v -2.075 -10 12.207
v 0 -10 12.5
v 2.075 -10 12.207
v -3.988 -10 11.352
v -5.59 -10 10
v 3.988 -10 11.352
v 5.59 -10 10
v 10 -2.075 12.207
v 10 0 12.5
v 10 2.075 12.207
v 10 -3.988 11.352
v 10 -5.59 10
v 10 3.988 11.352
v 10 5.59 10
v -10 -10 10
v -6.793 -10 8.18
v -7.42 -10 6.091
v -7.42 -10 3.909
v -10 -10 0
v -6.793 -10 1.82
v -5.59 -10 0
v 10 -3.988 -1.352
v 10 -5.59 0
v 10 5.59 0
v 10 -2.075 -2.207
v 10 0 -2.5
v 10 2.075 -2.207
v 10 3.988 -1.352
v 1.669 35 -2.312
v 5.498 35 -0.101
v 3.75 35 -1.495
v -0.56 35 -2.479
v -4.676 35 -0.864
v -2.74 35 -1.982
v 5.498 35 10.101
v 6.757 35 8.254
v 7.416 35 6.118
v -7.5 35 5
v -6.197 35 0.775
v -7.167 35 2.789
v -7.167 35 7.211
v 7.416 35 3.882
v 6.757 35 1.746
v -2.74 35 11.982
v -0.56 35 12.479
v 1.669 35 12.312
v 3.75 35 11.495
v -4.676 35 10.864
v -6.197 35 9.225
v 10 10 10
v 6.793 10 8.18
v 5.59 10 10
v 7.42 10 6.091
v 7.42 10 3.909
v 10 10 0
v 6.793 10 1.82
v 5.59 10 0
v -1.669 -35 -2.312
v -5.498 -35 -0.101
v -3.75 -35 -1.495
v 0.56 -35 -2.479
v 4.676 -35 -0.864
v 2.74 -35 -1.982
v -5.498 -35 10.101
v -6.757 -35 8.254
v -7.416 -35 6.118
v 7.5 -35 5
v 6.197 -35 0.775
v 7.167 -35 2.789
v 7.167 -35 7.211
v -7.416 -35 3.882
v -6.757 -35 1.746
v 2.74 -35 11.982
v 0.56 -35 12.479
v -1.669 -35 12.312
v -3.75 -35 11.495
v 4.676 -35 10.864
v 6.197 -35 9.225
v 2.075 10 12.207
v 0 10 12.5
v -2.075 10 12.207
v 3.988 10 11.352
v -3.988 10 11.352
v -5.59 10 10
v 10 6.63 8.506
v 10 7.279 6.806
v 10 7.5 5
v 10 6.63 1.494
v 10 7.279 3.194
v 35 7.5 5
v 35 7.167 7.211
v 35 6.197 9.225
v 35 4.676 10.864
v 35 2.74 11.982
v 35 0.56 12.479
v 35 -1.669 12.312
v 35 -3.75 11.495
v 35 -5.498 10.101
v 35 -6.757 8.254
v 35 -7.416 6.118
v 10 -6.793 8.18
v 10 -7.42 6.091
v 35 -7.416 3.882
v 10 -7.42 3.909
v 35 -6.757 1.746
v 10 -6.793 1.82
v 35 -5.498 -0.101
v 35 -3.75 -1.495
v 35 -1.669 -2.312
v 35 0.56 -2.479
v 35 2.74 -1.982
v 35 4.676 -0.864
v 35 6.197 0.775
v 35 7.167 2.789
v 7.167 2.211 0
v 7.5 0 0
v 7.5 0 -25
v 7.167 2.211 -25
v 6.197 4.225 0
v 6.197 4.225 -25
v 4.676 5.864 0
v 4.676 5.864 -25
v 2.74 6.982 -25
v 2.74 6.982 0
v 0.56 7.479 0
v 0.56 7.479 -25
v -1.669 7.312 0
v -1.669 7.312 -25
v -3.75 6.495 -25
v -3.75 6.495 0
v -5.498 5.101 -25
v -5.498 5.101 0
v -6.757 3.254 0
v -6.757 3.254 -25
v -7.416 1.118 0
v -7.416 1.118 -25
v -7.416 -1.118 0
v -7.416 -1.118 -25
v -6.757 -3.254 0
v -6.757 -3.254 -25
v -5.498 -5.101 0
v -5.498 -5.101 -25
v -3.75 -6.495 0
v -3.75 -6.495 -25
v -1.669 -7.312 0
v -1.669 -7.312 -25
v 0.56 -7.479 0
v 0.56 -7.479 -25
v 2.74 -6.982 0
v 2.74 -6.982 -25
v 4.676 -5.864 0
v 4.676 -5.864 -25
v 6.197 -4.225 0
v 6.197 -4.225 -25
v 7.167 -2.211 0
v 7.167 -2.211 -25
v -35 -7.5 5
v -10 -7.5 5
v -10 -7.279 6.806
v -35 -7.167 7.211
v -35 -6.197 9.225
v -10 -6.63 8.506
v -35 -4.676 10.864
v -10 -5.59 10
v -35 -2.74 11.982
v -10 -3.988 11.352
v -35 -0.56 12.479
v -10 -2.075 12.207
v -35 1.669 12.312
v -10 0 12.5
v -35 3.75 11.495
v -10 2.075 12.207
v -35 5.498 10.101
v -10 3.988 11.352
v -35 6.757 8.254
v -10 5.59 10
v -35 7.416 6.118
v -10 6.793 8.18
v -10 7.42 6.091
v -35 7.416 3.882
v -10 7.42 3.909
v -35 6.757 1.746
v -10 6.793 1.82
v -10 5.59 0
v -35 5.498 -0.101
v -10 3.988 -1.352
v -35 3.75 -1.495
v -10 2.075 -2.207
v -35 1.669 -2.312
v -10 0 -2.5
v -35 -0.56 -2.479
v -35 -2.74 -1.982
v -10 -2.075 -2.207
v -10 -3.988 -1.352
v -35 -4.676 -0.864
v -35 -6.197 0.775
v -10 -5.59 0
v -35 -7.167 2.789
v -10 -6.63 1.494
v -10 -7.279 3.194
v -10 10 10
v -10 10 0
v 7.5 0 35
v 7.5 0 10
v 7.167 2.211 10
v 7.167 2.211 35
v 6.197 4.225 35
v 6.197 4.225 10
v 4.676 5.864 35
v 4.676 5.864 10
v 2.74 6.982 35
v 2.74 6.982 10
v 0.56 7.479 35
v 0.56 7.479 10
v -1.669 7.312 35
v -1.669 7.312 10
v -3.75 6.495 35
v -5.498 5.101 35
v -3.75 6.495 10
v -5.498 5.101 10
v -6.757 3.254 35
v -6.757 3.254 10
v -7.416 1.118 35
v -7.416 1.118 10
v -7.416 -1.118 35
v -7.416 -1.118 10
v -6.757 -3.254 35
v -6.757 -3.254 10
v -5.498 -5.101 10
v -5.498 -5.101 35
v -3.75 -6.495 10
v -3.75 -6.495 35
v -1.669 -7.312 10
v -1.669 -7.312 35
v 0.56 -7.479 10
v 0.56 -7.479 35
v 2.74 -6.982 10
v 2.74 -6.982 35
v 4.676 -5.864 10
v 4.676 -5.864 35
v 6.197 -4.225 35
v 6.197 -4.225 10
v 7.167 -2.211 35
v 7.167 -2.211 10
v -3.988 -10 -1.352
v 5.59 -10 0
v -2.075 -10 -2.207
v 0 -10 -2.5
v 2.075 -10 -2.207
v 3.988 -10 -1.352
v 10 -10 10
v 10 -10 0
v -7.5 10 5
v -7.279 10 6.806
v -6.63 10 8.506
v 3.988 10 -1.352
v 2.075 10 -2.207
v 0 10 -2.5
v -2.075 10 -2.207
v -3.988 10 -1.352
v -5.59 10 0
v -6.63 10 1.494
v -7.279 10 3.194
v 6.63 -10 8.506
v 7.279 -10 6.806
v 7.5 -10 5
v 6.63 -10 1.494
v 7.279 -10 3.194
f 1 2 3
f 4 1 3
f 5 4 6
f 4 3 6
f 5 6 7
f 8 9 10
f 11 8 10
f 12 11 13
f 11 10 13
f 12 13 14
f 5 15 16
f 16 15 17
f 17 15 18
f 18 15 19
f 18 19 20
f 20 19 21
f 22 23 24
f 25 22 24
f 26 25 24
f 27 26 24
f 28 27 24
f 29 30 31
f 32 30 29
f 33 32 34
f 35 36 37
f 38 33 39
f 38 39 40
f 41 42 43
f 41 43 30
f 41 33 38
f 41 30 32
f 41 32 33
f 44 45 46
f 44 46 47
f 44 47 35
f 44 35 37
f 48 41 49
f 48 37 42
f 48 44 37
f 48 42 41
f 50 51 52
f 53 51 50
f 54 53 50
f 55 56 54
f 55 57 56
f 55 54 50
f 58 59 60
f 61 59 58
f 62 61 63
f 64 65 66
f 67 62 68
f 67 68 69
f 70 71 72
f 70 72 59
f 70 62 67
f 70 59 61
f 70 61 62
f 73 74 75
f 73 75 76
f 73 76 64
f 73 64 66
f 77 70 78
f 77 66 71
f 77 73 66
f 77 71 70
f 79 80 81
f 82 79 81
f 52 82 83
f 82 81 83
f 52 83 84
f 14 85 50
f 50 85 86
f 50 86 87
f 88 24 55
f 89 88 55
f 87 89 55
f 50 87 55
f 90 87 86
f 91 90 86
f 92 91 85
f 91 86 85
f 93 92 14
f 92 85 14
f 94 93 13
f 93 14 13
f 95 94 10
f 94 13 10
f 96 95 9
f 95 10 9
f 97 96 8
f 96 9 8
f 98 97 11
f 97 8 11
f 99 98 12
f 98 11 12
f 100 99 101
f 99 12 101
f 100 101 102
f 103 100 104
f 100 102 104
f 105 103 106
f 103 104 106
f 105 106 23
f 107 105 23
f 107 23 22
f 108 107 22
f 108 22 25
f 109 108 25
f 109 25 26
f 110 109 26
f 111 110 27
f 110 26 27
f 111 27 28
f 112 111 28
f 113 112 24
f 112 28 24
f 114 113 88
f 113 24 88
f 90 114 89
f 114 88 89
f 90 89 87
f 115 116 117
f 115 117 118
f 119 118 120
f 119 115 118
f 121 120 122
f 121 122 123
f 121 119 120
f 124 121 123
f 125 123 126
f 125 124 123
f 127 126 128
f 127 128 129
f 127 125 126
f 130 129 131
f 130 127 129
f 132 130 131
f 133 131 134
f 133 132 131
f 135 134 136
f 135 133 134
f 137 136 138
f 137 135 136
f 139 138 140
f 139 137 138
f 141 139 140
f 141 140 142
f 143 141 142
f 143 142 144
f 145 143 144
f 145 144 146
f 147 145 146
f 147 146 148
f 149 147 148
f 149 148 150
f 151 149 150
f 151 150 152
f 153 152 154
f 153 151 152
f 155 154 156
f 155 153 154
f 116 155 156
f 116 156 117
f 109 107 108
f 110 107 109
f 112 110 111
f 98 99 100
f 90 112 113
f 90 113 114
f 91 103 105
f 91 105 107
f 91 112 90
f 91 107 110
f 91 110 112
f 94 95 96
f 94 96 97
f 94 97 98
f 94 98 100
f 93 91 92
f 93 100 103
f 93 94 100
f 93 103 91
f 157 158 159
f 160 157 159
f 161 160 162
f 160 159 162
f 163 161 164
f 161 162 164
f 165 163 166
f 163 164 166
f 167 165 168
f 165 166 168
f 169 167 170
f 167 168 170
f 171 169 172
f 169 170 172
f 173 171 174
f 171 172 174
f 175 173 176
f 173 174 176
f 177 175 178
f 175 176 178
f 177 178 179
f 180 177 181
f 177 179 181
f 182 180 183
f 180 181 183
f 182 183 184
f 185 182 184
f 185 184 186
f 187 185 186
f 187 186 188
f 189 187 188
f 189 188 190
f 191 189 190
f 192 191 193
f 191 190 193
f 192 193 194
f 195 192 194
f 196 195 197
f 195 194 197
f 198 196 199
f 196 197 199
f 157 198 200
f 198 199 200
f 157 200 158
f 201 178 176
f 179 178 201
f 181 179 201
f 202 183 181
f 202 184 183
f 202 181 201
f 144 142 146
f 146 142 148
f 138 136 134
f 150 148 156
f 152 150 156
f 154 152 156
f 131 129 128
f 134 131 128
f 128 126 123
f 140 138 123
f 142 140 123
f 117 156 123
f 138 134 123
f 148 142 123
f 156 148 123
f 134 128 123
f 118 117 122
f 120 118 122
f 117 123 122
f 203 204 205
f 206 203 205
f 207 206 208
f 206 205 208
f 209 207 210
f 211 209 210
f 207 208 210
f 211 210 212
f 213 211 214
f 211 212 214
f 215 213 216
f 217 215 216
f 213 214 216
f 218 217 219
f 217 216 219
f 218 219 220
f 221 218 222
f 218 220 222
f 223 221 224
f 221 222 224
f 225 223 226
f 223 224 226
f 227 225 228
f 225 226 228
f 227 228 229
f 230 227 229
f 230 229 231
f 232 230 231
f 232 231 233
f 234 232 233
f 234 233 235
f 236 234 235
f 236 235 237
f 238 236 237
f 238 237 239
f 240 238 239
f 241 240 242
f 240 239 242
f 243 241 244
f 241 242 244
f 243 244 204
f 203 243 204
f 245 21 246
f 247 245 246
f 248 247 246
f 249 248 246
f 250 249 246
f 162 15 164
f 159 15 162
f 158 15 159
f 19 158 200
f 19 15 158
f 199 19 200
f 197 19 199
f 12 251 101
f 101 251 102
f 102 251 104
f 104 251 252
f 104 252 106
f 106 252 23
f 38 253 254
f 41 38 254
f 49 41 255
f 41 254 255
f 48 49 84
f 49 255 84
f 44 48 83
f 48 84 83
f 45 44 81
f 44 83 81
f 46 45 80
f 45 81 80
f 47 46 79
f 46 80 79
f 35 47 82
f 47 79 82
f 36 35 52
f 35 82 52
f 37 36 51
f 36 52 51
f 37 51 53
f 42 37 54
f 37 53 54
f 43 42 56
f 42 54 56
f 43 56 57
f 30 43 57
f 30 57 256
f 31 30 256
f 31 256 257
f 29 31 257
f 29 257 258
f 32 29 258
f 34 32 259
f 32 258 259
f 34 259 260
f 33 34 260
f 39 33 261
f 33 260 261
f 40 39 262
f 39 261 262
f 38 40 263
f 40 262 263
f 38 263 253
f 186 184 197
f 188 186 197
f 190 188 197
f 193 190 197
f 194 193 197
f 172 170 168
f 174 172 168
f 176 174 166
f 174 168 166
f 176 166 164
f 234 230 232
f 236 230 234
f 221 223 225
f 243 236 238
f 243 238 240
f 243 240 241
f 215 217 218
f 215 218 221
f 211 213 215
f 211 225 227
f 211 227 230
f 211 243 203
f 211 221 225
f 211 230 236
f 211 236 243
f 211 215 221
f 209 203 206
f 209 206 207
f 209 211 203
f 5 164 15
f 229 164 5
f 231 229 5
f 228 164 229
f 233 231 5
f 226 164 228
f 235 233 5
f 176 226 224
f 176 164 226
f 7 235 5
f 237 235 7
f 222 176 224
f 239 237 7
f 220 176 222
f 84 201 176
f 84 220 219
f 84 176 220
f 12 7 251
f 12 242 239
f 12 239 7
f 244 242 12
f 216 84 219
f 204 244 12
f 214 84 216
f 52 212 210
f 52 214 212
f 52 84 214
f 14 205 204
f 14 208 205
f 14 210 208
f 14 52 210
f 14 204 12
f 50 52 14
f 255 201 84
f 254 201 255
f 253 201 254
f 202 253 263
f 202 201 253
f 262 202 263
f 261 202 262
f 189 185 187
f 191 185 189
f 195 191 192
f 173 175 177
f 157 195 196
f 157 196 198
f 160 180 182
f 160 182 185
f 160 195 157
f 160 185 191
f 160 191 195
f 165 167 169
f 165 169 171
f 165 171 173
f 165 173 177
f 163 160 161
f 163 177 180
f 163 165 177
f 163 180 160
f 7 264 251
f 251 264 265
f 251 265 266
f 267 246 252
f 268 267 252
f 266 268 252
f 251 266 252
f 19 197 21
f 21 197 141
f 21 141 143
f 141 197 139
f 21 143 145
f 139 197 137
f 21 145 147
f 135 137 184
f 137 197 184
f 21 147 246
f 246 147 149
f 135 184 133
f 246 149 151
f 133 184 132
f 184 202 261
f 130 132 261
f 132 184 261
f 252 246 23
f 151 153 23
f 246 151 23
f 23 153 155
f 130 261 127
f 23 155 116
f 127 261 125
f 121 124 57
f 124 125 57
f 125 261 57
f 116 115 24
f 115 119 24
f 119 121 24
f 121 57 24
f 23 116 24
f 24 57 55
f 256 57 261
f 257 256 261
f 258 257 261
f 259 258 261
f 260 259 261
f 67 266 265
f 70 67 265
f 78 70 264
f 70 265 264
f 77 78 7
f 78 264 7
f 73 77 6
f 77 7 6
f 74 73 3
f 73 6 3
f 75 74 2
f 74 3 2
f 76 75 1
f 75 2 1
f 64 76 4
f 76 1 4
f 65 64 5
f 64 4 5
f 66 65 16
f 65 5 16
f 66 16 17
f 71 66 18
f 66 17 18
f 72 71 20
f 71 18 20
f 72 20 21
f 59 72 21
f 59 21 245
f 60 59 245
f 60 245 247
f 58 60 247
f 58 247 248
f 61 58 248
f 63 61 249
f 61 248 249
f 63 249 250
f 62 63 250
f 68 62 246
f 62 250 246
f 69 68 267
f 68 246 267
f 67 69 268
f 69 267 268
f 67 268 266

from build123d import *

# Parameters (mm, degrees)
F0_W      = 20
F0_H      = 20
F1_DEPTH  = 10
F2_R      = 7.5
F8_DEPTH  = 25
F3_R      = 7.5
F9_DEPTH  = 25
F4_R      = 7.5
F10_DEPTH = 25
F5_R      = 7.5
F11_DEPTH = 25
F6_R      = 7.5
F12_DEPTH = 25
F7_R      = 7.5
F13_DEPTH = 25


with BuildPart() as f1:
    # F0 (on Top) → F1 (new body)
    with BuildSketch(Plane.XY):
        Rectangle(F0_W, F0_H)
    extrude(amount=F1_DEPTH)

    # F2 (on face) → F8 (join)
    with BuildSketch(Plane.XY.offset(10)):
        Circle(F2_R)
    extrude(amount=F8_DEPTH)

    # F3 (on face) → F9 (join)
    with BuildSketch(Plane(origin=(0, 10, 0), x_dir=(-1, 0, 0), z_dir=(0, 1, 0))):
        with Locations((0, 5)):
            Circle(F3_R)
    extrude(amount=F9_DEPTH)

    # F4 (on face) → F10 (join)
    with BuildSketch(Plane.XZ.offset(10)):
        with Locations((0, 5)):
            Circle(F4_R)
    extrude(amount=F10_DEPTH)

    # F5 (on face) → F11 (join)
    with BuildSketch(Plane(origin=(-10, 0, 0), x_dir=(0, -1, 0), z_dir=(-1, 0, 0))):
        with Locations((0, 5)):
            Circle(F5_R)
    extrude(amount=F11_DEPTH)

    # F6 (on face) → F12 (join)
    with BuildSketch(Plane.YZ.offset(10)):
        with Locations((0, 5)):
            Circle(F6_R)
    extrude(amount=F12_DEPTH)

    # F7 (on face) → F13 (join)
    with BuildSketch(Plane.XY):
        Circle(F7_R)
    extrude(amount=-F13_DEPTH)


solid = f1.part
